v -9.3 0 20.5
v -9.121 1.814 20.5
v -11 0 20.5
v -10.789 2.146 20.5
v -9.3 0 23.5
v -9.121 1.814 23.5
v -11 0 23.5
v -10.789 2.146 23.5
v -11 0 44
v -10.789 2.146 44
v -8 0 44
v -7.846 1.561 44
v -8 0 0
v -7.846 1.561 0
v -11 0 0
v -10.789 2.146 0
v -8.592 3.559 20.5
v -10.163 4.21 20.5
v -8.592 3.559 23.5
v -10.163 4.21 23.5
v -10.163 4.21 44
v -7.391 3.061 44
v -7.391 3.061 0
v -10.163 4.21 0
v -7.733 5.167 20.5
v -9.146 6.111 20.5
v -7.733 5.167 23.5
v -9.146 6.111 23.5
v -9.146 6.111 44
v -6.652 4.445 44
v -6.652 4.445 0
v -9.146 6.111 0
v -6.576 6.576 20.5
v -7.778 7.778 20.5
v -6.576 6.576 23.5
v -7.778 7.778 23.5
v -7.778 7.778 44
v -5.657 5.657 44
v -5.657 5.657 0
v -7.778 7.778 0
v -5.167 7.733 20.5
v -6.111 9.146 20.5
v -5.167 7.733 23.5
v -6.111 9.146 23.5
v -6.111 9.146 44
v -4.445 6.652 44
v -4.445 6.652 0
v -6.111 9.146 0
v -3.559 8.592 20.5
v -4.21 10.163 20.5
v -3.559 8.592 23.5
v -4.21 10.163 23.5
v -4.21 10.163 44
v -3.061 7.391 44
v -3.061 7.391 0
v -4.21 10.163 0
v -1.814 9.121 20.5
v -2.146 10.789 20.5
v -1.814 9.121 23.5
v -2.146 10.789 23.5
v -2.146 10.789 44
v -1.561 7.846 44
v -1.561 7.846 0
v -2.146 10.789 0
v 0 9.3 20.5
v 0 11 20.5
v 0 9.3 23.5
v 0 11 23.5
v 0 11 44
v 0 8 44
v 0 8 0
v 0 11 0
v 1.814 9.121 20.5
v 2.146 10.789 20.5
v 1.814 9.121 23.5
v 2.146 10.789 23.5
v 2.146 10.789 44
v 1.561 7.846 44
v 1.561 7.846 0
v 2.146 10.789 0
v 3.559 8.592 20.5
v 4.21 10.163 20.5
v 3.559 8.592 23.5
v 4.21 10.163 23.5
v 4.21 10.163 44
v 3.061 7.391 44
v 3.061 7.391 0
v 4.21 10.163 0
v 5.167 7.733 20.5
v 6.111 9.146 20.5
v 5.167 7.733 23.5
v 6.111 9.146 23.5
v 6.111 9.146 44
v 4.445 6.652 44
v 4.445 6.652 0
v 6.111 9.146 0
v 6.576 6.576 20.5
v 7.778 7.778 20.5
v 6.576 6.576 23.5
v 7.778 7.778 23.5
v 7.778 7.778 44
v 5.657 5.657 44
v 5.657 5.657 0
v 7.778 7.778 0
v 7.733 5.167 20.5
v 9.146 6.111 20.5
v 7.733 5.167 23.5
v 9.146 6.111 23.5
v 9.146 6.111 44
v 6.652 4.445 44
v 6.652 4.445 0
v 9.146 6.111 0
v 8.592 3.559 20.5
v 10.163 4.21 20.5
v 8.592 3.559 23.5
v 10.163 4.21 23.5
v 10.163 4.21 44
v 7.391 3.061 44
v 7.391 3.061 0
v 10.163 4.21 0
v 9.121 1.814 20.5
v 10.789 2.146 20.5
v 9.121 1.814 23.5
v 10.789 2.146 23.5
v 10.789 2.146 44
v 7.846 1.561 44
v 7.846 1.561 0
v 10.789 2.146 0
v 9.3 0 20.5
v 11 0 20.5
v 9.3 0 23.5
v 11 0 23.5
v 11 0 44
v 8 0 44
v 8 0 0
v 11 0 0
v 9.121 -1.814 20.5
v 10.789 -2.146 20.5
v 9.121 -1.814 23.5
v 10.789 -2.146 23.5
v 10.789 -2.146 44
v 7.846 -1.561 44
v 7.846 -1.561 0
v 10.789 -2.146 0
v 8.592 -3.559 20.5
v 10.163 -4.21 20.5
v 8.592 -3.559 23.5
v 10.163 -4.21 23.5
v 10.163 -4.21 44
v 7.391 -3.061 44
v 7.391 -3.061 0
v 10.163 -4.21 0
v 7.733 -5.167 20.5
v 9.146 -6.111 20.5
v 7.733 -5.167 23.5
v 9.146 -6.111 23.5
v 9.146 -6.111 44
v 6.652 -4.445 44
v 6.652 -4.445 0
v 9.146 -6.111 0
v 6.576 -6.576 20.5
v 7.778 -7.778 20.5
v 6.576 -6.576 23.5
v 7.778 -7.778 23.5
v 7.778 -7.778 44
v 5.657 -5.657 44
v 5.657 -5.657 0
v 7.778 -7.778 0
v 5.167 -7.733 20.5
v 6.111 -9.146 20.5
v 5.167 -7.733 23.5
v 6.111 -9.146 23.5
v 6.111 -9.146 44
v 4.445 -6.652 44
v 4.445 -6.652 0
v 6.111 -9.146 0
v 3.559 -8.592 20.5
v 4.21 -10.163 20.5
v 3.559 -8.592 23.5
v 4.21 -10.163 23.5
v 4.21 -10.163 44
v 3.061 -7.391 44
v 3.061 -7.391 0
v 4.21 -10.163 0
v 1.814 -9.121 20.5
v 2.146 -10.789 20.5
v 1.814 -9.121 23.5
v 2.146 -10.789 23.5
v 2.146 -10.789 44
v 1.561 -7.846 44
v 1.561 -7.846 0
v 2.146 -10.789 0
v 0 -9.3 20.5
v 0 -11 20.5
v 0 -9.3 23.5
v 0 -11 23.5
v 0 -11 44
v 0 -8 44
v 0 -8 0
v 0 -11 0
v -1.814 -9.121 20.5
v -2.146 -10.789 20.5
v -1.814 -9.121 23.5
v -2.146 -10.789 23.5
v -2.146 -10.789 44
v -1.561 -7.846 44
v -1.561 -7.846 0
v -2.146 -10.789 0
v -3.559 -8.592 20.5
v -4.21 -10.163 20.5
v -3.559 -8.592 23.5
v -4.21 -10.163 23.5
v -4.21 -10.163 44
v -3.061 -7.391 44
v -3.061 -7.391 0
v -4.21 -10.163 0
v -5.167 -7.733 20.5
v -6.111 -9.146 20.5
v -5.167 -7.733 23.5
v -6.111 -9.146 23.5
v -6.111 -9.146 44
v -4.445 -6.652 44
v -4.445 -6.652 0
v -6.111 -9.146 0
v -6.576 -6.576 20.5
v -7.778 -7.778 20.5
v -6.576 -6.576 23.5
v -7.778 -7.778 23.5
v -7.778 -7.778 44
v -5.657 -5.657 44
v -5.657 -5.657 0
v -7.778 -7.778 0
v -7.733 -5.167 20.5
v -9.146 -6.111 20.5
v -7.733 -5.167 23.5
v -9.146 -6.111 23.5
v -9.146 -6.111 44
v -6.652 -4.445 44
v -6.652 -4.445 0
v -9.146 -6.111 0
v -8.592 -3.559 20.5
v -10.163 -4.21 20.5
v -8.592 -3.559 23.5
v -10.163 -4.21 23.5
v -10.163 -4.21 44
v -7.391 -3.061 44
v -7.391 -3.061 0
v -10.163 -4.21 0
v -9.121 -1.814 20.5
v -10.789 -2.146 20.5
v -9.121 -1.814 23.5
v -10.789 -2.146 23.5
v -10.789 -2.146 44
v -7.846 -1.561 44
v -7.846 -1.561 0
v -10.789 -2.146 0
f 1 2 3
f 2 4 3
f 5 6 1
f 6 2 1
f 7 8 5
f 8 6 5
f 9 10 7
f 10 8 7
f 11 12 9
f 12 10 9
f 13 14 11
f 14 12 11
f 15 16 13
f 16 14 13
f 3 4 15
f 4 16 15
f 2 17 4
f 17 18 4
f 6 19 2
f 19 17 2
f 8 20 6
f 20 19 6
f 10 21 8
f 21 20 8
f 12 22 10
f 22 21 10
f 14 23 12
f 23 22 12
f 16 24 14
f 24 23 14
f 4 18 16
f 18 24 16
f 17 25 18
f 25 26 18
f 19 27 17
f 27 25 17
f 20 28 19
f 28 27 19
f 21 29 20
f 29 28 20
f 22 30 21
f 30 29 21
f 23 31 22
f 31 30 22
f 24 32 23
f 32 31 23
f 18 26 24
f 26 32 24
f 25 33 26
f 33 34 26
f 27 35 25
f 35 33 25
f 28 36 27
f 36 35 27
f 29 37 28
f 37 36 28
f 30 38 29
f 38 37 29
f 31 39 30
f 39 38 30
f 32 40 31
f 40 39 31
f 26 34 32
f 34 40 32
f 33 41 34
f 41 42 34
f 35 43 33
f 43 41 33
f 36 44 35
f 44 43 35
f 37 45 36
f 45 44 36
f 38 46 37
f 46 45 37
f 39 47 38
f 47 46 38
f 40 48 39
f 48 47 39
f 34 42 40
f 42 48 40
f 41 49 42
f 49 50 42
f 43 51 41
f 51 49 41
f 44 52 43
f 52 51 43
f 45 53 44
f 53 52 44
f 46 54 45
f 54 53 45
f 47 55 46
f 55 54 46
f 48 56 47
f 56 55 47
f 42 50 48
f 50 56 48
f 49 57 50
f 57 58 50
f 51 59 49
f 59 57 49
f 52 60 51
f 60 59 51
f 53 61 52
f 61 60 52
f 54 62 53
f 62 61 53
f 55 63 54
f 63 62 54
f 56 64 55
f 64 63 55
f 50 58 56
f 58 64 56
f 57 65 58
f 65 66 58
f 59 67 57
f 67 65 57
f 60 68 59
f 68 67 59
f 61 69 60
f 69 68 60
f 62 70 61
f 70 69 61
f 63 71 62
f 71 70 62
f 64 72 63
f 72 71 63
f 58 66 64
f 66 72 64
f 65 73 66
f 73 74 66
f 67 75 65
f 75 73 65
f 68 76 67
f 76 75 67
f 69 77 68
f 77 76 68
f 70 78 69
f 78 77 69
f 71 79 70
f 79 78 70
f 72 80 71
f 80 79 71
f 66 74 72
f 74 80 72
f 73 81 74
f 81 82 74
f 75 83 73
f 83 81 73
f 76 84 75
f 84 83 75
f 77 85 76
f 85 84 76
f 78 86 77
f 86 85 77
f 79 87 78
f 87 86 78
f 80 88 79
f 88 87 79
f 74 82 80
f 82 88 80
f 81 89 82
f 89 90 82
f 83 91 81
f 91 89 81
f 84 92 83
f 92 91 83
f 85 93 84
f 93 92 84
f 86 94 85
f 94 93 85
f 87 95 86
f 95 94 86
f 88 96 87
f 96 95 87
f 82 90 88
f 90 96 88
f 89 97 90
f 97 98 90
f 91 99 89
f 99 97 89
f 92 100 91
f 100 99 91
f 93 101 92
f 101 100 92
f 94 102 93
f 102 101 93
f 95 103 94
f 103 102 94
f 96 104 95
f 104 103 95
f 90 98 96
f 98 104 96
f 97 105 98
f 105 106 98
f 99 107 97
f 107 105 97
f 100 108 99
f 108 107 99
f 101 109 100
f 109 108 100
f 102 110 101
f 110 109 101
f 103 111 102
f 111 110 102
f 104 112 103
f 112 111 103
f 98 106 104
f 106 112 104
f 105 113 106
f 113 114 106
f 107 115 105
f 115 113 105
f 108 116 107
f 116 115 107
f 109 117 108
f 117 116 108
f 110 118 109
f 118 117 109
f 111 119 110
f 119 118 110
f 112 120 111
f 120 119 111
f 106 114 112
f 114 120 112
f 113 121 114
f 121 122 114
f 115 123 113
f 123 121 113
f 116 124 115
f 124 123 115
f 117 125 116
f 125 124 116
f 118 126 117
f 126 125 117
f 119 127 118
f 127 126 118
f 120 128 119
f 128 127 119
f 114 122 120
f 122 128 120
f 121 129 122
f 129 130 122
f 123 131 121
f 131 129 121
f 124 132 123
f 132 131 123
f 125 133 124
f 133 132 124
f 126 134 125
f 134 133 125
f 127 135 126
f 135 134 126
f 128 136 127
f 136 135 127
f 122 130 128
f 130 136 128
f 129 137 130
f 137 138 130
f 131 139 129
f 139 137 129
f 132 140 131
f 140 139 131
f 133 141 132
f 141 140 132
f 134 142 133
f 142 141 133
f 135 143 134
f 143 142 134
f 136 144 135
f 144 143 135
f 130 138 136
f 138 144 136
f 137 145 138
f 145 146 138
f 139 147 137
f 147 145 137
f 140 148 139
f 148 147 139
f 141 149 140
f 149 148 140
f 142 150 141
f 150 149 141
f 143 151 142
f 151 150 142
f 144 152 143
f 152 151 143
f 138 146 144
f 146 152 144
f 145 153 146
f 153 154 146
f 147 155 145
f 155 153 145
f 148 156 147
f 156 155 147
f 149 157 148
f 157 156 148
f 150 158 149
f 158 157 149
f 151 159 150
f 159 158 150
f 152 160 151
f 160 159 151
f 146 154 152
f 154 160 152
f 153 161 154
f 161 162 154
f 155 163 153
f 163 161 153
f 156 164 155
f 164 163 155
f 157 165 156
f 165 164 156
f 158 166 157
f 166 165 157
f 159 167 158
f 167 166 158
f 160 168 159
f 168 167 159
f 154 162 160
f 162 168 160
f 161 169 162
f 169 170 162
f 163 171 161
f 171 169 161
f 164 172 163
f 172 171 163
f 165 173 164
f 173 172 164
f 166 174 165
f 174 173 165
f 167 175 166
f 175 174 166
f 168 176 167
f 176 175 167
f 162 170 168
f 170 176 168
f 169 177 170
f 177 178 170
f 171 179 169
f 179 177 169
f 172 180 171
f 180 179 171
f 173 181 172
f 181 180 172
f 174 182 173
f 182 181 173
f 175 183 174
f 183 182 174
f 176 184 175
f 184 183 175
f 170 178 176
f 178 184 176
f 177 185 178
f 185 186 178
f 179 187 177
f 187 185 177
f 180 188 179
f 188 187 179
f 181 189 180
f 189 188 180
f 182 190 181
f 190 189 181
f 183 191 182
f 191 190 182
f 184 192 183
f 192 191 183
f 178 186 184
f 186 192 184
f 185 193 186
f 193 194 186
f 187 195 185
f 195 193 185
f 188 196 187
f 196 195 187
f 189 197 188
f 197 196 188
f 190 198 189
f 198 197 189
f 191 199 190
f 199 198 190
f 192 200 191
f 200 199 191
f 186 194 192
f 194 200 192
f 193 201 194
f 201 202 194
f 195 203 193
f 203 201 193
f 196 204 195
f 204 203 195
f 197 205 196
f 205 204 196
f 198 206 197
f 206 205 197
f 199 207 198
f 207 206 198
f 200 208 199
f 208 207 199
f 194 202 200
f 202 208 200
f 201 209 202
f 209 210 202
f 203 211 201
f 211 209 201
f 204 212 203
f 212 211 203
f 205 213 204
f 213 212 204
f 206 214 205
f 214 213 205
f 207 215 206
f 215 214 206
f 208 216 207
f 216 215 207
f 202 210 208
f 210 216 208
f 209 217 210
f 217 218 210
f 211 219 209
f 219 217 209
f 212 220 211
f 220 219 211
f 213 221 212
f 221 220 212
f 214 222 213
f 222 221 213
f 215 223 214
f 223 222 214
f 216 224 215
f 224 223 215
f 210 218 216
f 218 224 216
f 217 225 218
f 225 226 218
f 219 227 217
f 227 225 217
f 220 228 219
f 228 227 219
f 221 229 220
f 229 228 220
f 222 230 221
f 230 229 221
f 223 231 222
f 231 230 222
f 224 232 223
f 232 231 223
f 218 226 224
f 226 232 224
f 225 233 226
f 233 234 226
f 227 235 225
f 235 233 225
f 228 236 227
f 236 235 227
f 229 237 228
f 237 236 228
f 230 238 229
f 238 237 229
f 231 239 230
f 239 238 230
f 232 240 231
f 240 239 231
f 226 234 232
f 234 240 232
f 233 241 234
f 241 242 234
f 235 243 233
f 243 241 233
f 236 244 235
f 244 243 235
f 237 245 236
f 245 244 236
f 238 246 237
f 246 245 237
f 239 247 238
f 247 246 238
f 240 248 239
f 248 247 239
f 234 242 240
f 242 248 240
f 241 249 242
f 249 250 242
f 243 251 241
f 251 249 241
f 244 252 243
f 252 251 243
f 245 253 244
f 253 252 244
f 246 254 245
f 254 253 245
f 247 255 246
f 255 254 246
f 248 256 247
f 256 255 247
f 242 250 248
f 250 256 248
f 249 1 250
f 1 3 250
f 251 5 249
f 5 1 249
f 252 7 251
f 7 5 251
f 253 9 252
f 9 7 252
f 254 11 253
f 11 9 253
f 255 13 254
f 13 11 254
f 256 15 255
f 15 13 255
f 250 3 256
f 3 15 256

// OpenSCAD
$fn = 32;

// ----------------------------------------------------------------------
// Grooved revolve: stepped, bore R8
// ----------------------------------------------------------------------

// --- parameters (mm) ---
bore_r = 8;               // bore radius
outer_r = 11;             // outer radius of the body
total_h = 44;             // overall height, Z
wall = 3;                 // radial wall thickness
groove_w = 3;             // groove width
groove_d = 1.7;           // groove depth
grooves = 1;              // number of outer grooves

bbox_x = 2 * outer_r;  // full diameter
bore_d = 2 * bore_r;  // bore diameter
body_d = 2 * outer_r;  // body diameter
revolve_angle = 360;  // full turn around the Z axis

profile = [[8, 0], [11, 0], [11, 20.5], [9.3, 20.5], [9.3, 23.5], [11, 23.5], [11, 44], [8, 44]];  // primary outline, 8 points, counter clockwise

// --- the one profile operation ---
rotate_extrude(angle = revolve_angle) polygon(points = profile);
